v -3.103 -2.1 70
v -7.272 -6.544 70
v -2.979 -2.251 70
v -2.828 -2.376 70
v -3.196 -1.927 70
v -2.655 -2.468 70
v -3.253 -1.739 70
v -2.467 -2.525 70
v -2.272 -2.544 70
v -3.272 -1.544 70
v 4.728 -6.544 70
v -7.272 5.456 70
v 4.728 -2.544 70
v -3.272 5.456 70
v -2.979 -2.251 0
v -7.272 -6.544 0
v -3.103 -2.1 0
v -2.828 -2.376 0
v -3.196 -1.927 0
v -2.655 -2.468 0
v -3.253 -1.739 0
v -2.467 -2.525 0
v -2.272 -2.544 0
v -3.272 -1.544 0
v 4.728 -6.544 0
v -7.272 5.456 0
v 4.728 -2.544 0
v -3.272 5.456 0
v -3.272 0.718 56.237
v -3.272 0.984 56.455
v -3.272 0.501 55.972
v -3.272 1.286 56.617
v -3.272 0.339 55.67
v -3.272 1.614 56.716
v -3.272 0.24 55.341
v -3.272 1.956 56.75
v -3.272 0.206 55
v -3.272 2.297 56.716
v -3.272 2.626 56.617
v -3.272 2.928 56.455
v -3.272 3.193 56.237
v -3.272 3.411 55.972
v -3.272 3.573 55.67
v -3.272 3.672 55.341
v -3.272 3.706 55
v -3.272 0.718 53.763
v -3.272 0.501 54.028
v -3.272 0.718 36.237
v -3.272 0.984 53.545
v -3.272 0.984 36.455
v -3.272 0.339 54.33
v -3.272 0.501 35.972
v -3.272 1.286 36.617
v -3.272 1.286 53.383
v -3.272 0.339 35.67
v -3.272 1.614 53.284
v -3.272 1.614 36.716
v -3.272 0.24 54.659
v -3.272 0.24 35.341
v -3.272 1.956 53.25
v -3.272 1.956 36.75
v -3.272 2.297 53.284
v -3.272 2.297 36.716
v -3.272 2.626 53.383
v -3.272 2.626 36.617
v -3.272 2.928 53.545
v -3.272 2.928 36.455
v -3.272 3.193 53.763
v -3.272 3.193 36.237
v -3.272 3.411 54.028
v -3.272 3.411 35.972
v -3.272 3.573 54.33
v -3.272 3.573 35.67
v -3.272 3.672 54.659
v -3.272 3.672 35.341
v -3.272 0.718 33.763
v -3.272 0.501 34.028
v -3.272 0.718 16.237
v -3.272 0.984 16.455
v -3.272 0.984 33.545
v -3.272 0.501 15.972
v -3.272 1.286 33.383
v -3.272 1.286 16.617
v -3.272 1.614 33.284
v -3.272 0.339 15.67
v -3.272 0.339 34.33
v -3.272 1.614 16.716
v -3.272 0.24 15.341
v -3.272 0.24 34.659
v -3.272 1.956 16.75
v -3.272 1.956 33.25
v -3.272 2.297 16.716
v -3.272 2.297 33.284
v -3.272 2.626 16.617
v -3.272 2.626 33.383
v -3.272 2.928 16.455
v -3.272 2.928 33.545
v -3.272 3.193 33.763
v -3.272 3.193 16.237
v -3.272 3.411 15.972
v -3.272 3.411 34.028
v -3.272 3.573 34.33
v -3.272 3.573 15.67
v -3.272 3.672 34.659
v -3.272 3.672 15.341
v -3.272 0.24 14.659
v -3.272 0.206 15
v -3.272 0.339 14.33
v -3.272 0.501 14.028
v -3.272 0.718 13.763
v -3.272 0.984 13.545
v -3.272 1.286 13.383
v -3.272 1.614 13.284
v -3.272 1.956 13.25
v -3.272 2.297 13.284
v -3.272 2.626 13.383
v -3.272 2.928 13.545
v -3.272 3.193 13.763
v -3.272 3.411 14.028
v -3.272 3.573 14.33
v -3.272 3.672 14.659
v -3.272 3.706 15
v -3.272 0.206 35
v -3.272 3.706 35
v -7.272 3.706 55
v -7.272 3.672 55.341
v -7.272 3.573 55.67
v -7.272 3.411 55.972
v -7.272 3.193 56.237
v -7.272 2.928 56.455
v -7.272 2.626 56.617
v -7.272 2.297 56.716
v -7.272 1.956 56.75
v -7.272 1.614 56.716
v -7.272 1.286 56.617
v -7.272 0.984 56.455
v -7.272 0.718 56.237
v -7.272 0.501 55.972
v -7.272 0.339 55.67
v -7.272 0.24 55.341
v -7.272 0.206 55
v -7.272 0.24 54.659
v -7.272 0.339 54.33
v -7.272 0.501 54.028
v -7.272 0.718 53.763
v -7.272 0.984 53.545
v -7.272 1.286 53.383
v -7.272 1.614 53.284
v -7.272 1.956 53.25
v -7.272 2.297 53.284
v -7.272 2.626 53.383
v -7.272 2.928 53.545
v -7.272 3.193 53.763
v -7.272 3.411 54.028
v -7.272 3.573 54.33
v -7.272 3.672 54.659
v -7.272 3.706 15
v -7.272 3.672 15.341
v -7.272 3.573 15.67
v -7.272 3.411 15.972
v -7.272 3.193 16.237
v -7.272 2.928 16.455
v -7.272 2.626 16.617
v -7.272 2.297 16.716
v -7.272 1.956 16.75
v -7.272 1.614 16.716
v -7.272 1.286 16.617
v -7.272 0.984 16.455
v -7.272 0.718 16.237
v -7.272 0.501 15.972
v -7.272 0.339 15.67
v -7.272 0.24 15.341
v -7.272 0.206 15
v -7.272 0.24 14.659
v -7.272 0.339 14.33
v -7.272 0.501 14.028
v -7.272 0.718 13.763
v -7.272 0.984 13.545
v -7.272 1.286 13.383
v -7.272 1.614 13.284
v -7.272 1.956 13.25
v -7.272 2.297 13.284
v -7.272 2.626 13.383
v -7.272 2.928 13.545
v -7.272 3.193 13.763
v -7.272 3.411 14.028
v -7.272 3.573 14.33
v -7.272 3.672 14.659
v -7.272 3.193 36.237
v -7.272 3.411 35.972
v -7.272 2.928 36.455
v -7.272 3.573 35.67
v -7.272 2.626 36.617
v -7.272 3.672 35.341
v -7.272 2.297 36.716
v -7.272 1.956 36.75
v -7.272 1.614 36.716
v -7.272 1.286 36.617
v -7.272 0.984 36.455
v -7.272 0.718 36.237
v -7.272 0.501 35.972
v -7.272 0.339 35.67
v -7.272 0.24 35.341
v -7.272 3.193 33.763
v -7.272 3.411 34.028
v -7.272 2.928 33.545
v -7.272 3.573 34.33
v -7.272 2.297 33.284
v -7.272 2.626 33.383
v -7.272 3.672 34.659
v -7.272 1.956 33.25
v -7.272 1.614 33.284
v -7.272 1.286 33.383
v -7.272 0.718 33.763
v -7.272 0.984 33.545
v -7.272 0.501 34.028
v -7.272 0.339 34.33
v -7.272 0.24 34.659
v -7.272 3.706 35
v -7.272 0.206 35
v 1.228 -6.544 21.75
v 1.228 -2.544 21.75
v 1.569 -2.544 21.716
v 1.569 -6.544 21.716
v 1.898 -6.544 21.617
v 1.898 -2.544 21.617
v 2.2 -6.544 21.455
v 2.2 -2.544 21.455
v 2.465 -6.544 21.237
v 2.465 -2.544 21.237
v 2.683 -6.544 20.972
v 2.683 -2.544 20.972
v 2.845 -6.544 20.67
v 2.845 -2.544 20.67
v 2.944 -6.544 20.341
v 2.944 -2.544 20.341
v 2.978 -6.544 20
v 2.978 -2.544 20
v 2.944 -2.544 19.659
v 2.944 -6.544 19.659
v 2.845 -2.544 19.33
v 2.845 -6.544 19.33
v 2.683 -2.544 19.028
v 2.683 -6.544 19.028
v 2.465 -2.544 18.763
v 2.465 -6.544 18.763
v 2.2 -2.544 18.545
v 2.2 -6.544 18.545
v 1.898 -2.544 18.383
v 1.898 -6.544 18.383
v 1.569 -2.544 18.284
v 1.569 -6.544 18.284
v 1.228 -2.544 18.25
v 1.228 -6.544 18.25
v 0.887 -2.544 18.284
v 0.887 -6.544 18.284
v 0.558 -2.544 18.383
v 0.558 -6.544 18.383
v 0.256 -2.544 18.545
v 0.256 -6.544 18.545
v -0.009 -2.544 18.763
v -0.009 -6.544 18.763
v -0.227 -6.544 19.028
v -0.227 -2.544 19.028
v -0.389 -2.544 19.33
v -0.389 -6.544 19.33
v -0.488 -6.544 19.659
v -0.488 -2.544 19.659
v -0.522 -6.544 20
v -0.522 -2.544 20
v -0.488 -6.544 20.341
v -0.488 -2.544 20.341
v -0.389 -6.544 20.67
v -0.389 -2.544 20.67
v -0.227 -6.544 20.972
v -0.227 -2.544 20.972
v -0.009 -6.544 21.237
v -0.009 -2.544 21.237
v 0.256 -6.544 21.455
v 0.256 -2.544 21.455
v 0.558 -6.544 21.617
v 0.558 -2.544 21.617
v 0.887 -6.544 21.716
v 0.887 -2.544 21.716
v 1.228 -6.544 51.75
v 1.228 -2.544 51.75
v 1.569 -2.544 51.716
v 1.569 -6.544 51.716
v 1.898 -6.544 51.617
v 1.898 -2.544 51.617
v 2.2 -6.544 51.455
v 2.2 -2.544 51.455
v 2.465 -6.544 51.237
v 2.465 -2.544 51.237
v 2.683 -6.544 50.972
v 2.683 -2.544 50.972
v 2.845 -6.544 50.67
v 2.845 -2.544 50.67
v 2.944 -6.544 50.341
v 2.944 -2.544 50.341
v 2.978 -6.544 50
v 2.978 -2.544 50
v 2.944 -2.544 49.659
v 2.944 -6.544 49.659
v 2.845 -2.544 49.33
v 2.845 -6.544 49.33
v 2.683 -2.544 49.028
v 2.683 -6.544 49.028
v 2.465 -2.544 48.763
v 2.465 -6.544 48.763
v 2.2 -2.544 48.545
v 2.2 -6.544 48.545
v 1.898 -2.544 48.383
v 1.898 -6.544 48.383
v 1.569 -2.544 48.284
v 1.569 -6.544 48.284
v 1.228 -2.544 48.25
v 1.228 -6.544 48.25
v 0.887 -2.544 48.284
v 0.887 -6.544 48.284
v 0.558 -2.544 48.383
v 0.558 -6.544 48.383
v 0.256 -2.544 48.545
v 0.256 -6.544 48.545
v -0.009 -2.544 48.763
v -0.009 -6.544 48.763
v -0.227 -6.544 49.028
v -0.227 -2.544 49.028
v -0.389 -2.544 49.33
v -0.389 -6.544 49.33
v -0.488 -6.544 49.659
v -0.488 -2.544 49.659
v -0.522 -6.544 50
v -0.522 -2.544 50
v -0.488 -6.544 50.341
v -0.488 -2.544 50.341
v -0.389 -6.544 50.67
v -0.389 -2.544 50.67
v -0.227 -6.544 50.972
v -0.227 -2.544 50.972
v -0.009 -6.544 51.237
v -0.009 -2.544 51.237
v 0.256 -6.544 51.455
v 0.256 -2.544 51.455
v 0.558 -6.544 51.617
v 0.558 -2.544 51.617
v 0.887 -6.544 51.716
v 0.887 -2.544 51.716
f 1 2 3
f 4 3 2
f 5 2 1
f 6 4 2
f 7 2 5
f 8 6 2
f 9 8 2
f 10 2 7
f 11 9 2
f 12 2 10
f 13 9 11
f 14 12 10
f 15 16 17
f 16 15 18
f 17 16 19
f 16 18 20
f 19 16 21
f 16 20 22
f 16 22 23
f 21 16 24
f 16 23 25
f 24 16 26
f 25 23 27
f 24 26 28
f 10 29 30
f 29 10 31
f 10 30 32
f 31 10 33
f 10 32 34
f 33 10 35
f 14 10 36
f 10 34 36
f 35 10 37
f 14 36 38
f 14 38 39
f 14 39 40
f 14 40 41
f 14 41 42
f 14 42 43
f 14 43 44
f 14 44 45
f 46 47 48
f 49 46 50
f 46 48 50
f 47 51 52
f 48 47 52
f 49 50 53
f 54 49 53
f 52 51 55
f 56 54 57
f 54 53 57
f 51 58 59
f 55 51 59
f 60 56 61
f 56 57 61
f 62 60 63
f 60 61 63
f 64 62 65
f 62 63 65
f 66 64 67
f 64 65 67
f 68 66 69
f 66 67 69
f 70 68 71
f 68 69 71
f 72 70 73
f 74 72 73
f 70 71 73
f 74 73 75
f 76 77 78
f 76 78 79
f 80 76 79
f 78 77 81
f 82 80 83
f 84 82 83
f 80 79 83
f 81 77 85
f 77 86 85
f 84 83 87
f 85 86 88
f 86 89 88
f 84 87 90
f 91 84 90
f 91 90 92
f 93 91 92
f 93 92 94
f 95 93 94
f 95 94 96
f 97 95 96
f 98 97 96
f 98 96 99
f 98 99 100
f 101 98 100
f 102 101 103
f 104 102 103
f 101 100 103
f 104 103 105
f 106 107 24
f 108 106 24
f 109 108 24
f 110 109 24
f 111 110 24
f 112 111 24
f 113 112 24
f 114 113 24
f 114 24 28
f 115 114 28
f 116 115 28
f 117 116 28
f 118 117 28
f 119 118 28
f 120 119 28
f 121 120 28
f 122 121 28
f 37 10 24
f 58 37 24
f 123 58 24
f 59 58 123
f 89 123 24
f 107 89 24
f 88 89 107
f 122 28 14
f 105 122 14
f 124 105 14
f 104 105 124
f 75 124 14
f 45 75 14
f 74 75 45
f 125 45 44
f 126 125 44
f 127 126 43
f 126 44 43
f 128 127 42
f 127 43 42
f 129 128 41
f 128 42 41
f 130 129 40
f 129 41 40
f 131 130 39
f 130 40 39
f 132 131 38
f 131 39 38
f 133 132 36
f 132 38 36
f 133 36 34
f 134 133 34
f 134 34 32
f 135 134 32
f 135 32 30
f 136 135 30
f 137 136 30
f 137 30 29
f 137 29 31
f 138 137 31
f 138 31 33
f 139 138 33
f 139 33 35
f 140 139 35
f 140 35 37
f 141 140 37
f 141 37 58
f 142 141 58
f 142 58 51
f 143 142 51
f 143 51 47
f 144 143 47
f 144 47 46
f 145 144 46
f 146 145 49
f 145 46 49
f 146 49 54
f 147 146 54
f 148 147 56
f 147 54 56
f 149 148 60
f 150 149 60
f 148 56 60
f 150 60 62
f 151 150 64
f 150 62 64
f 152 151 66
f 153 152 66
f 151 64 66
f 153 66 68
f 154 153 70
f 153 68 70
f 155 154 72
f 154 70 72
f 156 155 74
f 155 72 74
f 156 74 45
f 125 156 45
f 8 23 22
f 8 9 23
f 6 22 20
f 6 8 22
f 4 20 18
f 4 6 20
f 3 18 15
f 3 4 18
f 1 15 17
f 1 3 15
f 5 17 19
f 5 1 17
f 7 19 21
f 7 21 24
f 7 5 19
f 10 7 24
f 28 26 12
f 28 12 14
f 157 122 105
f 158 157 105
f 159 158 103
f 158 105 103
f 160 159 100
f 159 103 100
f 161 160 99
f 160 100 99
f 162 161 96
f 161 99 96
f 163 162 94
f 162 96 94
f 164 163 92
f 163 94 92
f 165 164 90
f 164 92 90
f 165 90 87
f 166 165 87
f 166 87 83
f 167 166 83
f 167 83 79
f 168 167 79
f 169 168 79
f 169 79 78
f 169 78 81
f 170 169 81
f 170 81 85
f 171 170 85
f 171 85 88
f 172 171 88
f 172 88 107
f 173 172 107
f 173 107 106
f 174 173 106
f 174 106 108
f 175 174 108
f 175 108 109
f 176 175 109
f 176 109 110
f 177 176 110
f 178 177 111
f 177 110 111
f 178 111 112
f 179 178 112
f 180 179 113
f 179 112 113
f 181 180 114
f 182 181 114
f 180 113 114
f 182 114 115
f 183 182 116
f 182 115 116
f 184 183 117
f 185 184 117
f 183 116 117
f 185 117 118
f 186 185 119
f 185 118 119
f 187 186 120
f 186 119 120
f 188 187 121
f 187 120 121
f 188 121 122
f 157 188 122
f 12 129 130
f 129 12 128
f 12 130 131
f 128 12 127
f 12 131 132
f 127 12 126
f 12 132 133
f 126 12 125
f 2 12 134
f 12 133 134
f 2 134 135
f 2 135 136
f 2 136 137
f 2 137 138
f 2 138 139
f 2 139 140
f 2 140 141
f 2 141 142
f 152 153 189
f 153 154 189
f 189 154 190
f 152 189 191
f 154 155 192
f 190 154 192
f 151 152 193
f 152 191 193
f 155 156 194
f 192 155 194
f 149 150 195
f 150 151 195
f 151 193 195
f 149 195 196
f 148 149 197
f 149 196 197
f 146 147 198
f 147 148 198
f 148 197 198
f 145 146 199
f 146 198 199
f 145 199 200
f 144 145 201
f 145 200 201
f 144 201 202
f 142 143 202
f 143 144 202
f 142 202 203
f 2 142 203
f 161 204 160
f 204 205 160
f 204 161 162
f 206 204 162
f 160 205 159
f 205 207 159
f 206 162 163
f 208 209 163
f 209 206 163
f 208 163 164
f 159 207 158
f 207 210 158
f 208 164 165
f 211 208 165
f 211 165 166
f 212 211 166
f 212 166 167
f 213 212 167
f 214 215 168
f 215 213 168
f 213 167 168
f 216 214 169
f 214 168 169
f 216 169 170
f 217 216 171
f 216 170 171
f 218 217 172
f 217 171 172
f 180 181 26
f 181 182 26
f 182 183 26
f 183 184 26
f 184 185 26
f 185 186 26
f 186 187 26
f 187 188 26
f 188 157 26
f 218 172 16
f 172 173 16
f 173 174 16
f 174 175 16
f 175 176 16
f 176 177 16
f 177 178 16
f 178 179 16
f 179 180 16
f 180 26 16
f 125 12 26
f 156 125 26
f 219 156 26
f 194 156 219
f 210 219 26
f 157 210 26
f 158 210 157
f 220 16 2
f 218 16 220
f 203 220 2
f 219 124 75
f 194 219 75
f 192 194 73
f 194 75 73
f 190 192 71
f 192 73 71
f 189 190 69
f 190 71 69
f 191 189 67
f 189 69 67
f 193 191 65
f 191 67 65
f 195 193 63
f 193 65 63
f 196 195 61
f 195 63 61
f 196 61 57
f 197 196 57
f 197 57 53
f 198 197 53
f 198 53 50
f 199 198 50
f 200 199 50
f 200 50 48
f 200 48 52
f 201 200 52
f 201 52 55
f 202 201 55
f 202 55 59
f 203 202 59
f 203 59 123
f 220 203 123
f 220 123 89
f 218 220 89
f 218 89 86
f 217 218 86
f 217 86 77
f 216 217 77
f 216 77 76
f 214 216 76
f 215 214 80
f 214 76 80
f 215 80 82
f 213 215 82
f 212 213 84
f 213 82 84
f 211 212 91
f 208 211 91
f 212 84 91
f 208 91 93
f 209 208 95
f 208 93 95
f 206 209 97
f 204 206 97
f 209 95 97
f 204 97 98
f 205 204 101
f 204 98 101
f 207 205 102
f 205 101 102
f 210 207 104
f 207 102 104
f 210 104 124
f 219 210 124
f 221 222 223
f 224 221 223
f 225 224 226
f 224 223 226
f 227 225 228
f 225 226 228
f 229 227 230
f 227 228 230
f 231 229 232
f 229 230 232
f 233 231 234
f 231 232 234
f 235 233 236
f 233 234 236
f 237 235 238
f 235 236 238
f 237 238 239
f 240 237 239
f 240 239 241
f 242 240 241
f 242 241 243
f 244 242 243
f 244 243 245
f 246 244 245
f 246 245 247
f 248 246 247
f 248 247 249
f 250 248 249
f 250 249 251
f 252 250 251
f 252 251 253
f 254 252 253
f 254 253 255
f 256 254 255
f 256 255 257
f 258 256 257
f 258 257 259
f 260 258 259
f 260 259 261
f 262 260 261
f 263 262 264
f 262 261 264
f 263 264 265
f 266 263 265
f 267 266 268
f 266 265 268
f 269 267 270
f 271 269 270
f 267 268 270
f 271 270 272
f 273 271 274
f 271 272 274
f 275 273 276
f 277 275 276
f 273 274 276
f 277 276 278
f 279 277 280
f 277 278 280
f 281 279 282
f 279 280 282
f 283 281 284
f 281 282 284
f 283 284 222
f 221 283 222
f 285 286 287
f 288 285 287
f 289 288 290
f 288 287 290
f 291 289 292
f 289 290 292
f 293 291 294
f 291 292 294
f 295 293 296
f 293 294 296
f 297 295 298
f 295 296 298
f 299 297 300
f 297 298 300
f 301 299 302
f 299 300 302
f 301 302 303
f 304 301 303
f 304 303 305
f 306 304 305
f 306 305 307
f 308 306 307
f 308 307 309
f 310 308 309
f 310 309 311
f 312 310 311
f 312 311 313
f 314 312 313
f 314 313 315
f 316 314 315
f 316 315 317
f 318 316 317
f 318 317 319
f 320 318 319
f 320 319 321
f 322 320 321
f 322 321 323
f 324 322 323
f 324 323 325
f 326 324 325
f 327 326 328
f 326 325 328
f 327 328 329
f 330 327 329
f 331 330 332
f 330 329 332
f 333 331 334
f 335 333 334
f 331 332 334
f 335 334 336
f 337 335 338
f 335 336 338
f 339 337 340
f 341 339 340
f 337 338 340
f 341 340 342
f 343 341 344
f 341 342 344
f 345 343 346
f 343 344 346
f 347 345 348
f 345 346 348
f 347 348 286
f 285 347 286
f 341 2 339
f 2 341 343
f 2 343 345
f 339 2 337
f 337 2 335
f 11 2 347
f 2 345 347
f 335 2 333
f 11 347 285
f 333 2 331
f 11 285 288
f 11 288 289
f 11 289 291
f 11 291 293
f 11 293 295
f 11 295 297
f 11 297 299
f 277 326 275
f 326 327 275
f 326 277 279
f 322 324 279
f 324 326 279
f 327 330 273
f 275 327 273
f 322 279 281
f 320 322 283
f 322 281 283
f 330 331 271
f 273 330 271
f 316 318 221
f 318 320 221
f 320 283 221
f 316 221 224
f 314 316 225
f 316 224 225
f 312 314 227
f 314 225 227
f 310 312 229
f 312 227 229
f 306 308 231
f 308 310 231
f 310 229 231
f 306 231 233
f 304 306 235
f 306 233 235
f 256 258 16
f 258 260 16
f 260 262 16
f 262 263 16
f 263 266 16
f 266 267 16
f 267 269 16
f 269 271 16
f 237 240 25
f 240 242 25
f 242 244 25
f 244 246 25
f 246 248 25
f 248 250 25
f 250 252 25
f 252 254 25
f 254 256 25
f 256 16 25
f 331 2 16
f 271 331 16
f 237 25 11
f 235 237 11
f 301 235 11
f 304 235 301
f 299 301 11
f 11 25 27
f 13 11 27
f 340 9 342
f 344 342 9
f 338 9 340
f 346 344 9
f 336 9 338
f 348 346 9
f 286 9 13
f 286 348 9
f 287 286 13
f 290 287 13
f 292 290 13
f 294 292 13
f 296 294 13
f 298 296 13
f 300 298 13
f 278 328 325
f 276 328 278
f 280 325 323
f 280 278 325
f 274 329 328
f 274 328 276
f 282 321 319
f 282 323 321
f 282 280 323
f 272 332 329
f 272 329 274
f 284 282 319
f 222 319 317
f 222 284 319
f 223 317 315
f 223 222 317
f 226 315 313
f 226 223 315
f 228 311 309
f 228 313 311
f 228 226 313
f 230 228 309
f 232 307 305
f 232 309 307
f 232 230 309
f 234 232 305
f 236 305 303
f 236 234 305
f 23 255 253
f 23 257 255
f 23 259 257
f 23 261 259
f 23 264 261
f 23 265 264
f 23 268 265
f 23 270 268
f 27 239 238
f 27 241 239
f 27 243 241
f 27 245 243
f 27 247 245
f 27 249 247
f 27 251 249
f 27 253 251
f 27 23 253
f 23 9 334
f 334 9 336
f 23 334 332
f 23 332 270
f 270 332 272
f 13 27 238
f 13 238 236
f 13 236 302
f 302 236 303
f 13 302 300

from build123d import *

# Parameters (mm, degrees)
SKETCH1_W           = 4
SKETCH1_H           = 8
SKETCH1_H_2         = 4
SKETCH1_W_2         = 8
BOSS_EXTRUDE1_DEPTH = 70
FILLET1_R           = 1
SKETCH3_R           = 1.75
CUT_EXTRUDE2_DEPTH  = 70
CUT_EXTRUDE3_REACH  = 72.83
SKETCH2_R           = 1.75


with BuildPart() as part:
    # Sketch1 → Boss-Extrude1 (new body)
    with BuildSketch(Plane.XY):
        with Locations((-5.272021997, 1.455882353)):
            Rectangle(SKETCH1_W, SKETCH1_H)
        with Locations((-5.272021997, -4.544117647)):
            Rectangle(SKETCH1_W, SKETCH1_H_2)
        with Locations((0.727978003, -4.544117647)):
            Rectangle(SKETCH1_W_2, SKETCH1_H_2)
    extrude(amount=BOSS_EXTRUDE1_DEPTH)

    # Fillet1
    fillet1_edges = [part.edges().sort_by_distance(p)[0] for p in [
        (-3.272021997, -2.544117647, 35),
    ]]
    fillet(fillet1_edges, radius=FILLET1_R)

    # Sketch3 → Cut-Extrude2 (cut)
    with BuildSketch(Plane(origin=(-3.272021997, 0, 0), x_dir=(0, 0, -1), z_dir=(1, 0, 0))):
        with Locations(Location((-55, 1.955882353, 0), (0, 0, 90))):
            Circle(SKETCH3_R)
        with Locations(Location((-15, 1.955882353, 0), (0, 0, 90))):
            Circle(SKETCH3_R)
        with Locations(Location((-35, 1.955882353, 0), (0, 0, 90))):
            Circle(SKETCH3_R)
    extrude(amount=-CUT_EXTRUDE2_DEPTH, mode=Mode.SUBTRACT)

    # Sketch2 → Cut-Extrude3 (cut, up to next)
    with BuildSketch(Plane(origin=(0, -2.544117647, 0), x_dir=(1, 0, 0), z_dir=(0, 1, 0)), mode=Mode.PRIVATE) as cut_extrude3_sk1:
        with Locations(Location((1.227978003, -50, 0), (0, 0, 270))):
            Circle(SKETCH2_R)
    cut_extrude3_tool1 = extrude(cut_extrude3_sk1.sketch, amount=-CUT_EXTRUDE3_REACH, mode=Mode.PRIVATE) & part.part
    # Sketch2 → Cut-Extrude3 (cut, up to next)
    with BuildSketch(Plane(origin=(0, -2.544117647, 0), x_dir=(1, 0, 0), z_dir=(0, 1, 0)), mode=Mode.PRIVATE) as cut_extrude3_sk2:
        with Locations(Location((1.227978003, -20, 0), (0, 0, 270))):
            Circle(SKETCH2_R)
    cut_extrude3_tool2 = extrude(cut_extrude3_sk2.sketch, amount=-CUT_EXTRUDE3_REACH, mode=Mode.PRIVATE) & part.part
    add(cut_extrude3_tool1.solids().sort_by_distance((1.227978, -2.544118, 50))[0], mode=Mode.SUBTRACT)
    add(cut_extrude3_tool2.solids().sort_by_distance((1.227978, -2.544118, 20))[0], mode=Mode.SUBTRACT)


solid = part.part
